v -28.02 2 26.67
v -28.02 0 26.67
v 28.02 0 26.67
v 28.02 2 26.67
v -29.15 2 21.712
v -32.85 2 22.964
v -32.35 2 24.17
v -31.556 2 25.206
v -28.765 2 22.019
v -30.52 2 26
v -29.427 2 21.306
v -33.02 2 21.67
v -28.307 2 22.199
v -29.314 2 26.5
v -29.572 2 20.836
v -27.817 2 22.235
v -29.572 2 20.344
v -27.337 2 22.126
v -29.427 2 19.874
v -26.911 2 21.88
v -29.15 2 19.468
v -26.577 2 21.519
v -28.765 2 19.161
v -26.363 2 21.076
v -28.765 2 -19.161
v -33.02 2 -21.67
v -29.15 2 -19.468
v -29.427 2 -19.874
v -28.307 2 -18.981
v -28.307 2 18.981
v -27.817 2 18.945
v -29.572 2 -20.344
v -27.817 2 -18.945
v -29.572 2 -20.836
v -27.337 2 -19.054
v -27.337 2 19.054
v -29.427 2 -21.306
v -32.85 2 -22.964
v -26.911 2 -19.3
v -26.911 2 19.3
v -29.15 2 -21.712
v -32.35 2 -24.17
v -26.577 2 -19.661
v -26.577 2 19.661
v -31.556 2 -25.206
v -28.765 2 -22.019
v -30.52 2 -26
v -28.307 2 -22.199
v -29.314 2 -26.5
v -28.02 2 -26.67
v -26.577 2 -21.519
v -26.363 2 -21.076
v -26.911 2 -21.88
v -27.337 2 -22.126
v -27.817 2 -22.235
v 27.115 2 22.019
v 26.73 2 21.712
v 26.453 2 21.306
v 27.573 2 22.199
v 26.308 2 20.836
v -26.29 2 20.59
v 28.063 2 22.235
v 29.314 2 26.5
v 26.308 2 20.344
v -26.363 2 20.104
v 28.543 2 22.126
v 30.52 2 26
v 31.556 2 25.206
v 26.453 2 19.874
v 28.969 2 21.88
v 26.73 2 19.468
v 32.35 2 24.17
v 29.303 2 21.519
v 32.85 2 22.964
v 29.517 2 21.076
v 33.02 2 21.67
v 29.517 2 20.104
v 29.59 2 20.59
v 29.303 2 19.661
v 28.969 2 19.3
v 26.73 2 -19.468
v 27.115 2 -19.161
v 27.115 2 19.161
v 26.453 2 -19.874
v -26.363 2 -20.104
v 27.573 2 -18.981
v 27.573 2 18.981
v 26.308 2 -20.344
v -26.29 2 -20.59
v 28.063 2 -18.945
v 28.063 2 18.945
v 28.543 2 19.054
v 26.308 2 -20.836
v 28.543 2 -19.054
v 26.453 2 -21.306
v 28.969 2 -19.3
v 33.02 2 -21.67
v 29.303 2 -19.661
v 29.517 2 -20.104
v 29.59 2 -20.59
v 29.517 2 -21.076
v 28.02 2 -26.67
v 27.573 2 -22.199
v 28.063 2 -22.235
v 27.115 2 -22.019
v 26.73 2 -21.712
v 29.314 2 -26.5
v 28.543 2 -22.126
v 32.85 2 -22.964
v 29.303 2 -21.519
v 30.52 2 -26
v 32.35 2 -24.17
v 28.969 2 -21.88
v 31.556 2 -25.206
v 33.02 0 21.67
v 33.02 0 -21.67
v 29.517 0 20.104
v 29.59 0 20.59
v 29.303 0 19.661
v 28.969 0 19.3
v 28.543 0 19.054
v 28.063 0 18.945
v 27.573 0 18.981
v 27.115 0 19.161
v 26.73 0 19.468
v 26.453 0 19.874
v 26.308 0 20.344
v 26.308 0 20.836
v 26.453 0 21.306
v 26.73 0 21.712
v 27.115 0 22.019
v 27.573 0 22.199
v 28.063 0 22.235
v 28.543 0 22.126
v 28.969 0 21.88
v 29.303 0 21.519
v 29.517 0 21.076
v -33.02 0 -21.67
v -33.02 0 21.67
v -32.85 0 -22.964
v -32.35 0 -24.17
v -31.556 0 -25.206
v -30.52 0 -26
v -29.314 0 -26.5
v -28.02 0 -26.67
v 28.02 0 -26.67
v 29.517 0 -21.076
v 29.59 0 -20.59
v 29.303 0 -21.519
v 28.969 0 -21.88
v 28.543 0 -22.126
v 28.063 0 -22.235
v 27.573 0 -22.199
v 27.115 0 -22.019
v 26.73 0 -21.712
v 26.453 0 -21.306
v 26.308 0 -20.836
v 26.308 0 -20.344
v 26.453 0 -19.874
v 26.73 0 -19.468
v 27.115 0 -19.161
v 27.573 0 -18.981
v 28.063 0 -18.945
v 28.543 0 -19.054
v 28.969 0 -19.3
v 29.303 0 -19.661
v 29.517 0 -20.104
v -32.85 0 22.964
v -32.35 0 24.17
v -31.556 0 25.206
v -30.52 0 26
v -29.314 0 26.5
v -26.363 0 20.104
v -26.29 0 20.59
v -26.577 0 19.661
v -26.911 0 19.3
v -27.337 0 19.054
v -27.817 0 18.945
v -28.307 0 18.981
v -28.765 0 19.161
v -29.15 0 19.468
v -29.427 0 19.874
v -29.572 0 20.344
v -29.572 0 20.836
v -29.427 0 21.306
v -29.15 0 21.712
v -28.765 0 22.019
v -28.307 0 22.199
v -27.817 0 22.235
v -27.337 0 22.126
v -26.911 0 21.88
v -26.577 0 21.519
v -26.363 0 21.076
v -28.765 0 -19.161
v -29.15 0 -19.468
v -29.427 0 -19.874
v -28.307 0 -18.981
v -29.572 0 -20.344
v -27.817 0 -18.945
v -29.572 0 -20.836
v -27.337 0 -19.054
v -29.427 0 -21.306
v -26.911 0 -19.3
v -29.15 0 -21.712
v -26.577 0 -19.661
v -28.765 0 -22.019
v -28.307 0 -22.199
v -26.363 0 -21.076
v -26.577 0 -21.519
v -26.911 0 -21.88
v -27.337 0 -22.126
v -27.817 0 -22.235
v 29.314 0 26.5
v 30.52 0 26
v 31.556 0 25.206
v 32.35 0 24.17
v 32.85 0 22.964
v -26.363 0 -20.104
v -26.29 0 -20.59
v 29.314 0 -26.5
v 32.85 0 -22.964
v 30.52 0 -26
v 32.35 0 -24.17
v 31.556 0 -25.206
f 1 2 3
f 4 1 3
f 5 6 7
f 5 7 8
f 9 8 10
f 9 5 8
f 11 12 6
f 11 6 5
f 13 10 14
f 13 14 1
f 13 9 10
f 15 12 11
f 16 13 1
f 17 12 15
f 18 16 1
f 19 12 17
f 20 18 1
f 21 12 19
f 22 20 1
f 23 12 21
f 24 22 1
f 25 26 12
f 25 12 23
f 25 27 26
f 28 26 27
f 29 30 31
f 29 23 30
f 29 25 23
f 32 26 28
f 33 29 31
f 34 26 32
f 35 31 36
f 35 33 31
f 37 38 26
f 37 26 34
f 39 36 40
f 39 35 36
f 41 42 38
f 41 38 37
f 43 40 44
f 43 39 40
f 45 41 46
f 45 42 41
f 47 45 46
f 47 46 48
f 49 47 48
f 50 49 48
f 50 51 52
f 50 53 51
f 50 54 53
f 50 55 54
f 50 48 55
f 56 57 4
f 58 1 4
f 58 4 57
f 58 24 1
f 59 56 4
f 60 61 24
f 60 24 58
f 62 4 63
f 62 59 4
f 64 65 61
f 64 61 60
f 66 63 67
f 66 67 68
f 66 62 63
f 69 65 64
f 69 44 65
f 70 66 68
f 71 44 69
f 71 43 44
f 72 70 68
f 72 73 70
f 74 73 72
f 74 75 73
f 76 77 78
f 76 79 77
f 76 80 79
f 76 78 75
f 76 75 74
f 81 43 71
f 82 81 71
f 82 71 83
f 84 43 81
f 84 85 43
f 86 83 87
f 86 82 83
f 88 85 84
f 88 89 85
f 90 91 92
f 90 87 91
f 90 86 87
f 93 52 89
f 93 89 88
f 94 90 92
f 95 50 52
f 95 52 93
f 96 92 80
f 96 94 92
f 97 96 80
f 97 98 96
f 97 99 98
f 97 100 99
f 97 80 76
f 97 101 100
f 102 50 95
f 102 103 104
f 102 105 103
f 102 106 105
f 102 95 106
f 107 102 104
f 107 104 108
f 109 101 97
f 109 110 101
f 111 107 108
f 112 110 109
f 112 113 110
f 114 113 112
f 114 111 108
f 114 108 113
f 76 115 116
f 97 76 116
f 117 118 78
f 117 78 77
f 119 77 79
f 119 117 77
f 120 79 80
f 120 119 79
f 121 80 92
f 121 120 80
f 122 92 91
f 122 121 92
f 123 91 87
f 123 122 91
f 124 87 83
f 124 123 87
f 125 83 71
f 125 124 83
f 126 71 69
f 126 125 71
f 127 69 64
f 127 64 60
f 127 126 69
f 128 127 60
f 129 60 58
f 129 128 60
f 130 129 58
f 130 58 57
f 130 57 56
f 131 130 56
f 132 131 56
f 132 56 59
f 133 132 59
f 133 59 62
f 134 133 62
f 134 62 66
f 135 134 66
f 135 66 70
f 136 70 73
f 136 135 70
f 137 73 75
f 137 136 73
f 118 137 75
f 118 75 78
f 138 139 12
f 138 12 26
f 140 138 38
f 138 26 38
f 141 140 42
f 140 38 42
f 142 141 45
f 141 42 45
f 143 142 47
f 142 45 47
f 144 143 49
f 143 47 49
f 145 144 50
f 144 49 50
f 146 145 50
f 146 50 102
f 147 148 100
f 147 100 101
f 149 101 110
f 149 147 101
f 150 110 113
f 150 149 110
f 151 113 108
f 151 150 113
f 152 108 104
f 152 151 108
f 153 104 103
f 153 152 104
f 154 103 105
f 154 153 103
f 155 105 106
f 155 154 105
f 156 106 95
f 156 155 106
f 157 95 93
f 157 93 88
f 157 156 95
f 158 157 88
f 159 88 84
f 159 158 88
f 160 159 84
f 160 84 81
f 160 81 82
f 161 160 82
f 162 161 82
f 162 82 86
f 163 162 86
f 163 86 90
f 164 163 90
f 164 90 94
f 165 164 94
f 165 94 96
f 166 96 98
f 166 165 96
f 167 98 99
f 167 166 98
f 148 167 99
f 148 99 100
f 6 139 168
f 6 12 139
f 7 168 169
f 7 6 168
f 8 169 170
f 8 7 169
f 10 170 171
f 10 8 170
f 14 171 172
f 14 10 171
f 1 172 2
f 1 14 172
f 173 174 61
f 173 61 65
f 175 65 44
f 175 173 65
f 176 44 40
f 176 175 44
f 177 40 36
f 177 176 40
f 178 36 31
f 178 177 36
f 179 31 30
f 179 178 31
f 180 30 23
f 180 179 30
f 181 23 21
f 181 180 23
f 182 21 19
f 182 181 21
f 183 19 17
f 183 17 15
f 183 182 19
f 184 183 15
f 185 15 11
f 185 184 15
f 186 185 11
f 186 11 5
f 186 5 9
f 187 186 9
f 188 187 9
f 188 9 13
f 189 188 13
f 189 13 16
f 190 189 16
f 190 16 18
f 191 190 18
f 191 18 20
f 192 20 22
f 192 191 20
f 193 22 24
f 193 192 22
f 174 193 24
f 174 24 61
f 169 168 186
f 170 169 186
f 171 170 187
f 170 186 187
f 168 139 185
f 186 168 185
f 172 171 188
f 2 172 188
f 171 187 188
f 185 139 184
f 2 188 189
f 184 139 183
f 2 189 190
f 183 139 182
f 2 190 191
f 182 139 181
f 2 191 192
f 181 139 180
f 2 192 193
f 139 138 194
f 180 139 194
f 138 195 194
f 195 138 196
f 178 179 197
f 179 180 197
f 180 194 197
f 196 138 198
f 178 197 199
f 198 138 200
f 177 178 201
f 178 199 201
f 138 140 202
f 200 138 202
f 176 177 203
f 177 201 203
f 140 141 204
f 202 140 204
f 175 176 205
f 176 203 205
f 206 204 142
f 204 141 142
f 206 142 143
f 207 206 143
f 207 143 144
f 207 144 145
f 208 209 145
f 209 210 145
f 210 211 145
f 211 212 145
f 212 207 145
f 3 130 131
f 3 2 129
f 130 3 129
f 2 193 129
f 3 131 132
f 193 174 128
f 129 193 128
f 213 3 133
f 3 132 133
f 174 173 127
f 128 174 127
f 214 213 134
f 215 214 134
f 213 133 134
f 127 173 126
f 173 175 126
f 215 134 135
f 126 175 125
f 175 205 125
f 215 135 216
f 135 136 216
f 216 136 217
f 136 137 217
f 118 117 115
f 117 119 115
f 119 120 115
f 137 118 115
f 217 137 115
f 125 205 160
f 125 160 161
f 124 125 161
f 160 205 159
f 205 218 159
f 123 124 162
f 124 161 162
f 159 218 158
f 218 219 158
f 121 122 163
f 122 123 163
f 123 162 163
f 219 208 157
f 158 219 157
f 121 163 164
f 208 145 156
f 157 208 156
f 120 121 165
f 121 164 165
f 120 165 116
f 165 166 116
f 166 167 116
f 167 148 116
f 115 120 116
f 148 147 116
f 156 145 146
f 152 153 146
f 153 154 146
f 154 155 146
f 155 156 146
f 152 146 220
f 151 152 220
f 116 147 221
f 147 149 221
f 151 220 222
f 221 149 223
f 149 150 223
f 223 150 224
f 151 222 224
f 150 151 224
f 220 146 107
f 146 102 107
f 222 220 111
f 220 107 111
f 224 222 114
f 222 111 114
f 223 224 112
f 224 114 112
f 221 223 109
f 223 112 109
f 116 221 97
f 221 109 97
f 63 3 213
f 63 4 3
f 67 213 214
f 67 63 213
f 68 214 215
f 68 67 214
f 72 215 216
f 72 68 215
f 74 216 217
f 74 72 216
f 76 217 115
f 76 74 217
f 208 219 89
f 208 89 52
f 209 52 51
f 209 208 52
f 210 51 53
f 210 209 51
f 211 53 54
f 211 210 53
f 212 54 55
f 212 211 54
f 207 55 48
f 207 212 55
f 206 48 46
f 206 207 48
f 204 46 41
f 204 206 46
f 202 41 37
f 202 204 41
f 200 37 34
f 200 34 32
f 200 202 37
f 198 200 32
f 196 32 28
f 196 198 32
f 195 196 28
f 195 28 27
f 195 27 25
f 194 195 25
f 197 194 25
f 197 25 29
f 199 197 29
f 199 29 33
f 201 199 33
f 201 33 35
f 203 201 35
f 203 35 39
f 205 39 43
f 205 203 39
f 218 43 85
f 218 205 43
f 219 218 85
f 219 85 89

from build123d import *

# Parameters (mm, degrees)
ESQUISSE1_W        = 66.04
ESQUISSE1_H        = 53.34
ESQUISSE1_R        = 1.65
BOSS_EXTRU_1_DEPTH = 2
CONG_1_R           = 5


with BuildPart() as part:
    # Esquisse1 → Boss.-Extru.1 (new body)
    with BuildSketch(Plane(origin=(0, 0, 0), x_dir=(1, 0, 0), z_dir=(0, 1, 0))):
        Rectangle(ESQUISSE1_W, ESQUISSE1_H)
        with Locations((-27.94, 20.59)):
            Circle(ESQUISSE1_R, mode=Mode.SUBTRACT)
        with Locations((27.94, 20.59)):
            Circle(ESQUISSE1_R, mode=Mode.SUBTRACT)
        with Locations((27.94, -20.59)):
            Circle(ESQUISSE1_R, mode=Mode.SUBTRACT)
        with Locations((-27.94, -20.59)):
            Circle(ESQUISSE1_R, mode=Mode.SUBTRACT)
    extrude(amount=BOSS_EXTRU_1_DEPTH)

    # Congé1
    cong_1_edges = [part.edges().sort_by_distance(p)[0] for p in [
        (33.02, 1, 26.67),
        (-33.02, 1, 26.67),
        (-33.02, 1, -26.67),
        (33.02, 1, -26.67),
    ]]
    fillet(cong_1_edges, radius=CONG_1_R)


solid = part.part
